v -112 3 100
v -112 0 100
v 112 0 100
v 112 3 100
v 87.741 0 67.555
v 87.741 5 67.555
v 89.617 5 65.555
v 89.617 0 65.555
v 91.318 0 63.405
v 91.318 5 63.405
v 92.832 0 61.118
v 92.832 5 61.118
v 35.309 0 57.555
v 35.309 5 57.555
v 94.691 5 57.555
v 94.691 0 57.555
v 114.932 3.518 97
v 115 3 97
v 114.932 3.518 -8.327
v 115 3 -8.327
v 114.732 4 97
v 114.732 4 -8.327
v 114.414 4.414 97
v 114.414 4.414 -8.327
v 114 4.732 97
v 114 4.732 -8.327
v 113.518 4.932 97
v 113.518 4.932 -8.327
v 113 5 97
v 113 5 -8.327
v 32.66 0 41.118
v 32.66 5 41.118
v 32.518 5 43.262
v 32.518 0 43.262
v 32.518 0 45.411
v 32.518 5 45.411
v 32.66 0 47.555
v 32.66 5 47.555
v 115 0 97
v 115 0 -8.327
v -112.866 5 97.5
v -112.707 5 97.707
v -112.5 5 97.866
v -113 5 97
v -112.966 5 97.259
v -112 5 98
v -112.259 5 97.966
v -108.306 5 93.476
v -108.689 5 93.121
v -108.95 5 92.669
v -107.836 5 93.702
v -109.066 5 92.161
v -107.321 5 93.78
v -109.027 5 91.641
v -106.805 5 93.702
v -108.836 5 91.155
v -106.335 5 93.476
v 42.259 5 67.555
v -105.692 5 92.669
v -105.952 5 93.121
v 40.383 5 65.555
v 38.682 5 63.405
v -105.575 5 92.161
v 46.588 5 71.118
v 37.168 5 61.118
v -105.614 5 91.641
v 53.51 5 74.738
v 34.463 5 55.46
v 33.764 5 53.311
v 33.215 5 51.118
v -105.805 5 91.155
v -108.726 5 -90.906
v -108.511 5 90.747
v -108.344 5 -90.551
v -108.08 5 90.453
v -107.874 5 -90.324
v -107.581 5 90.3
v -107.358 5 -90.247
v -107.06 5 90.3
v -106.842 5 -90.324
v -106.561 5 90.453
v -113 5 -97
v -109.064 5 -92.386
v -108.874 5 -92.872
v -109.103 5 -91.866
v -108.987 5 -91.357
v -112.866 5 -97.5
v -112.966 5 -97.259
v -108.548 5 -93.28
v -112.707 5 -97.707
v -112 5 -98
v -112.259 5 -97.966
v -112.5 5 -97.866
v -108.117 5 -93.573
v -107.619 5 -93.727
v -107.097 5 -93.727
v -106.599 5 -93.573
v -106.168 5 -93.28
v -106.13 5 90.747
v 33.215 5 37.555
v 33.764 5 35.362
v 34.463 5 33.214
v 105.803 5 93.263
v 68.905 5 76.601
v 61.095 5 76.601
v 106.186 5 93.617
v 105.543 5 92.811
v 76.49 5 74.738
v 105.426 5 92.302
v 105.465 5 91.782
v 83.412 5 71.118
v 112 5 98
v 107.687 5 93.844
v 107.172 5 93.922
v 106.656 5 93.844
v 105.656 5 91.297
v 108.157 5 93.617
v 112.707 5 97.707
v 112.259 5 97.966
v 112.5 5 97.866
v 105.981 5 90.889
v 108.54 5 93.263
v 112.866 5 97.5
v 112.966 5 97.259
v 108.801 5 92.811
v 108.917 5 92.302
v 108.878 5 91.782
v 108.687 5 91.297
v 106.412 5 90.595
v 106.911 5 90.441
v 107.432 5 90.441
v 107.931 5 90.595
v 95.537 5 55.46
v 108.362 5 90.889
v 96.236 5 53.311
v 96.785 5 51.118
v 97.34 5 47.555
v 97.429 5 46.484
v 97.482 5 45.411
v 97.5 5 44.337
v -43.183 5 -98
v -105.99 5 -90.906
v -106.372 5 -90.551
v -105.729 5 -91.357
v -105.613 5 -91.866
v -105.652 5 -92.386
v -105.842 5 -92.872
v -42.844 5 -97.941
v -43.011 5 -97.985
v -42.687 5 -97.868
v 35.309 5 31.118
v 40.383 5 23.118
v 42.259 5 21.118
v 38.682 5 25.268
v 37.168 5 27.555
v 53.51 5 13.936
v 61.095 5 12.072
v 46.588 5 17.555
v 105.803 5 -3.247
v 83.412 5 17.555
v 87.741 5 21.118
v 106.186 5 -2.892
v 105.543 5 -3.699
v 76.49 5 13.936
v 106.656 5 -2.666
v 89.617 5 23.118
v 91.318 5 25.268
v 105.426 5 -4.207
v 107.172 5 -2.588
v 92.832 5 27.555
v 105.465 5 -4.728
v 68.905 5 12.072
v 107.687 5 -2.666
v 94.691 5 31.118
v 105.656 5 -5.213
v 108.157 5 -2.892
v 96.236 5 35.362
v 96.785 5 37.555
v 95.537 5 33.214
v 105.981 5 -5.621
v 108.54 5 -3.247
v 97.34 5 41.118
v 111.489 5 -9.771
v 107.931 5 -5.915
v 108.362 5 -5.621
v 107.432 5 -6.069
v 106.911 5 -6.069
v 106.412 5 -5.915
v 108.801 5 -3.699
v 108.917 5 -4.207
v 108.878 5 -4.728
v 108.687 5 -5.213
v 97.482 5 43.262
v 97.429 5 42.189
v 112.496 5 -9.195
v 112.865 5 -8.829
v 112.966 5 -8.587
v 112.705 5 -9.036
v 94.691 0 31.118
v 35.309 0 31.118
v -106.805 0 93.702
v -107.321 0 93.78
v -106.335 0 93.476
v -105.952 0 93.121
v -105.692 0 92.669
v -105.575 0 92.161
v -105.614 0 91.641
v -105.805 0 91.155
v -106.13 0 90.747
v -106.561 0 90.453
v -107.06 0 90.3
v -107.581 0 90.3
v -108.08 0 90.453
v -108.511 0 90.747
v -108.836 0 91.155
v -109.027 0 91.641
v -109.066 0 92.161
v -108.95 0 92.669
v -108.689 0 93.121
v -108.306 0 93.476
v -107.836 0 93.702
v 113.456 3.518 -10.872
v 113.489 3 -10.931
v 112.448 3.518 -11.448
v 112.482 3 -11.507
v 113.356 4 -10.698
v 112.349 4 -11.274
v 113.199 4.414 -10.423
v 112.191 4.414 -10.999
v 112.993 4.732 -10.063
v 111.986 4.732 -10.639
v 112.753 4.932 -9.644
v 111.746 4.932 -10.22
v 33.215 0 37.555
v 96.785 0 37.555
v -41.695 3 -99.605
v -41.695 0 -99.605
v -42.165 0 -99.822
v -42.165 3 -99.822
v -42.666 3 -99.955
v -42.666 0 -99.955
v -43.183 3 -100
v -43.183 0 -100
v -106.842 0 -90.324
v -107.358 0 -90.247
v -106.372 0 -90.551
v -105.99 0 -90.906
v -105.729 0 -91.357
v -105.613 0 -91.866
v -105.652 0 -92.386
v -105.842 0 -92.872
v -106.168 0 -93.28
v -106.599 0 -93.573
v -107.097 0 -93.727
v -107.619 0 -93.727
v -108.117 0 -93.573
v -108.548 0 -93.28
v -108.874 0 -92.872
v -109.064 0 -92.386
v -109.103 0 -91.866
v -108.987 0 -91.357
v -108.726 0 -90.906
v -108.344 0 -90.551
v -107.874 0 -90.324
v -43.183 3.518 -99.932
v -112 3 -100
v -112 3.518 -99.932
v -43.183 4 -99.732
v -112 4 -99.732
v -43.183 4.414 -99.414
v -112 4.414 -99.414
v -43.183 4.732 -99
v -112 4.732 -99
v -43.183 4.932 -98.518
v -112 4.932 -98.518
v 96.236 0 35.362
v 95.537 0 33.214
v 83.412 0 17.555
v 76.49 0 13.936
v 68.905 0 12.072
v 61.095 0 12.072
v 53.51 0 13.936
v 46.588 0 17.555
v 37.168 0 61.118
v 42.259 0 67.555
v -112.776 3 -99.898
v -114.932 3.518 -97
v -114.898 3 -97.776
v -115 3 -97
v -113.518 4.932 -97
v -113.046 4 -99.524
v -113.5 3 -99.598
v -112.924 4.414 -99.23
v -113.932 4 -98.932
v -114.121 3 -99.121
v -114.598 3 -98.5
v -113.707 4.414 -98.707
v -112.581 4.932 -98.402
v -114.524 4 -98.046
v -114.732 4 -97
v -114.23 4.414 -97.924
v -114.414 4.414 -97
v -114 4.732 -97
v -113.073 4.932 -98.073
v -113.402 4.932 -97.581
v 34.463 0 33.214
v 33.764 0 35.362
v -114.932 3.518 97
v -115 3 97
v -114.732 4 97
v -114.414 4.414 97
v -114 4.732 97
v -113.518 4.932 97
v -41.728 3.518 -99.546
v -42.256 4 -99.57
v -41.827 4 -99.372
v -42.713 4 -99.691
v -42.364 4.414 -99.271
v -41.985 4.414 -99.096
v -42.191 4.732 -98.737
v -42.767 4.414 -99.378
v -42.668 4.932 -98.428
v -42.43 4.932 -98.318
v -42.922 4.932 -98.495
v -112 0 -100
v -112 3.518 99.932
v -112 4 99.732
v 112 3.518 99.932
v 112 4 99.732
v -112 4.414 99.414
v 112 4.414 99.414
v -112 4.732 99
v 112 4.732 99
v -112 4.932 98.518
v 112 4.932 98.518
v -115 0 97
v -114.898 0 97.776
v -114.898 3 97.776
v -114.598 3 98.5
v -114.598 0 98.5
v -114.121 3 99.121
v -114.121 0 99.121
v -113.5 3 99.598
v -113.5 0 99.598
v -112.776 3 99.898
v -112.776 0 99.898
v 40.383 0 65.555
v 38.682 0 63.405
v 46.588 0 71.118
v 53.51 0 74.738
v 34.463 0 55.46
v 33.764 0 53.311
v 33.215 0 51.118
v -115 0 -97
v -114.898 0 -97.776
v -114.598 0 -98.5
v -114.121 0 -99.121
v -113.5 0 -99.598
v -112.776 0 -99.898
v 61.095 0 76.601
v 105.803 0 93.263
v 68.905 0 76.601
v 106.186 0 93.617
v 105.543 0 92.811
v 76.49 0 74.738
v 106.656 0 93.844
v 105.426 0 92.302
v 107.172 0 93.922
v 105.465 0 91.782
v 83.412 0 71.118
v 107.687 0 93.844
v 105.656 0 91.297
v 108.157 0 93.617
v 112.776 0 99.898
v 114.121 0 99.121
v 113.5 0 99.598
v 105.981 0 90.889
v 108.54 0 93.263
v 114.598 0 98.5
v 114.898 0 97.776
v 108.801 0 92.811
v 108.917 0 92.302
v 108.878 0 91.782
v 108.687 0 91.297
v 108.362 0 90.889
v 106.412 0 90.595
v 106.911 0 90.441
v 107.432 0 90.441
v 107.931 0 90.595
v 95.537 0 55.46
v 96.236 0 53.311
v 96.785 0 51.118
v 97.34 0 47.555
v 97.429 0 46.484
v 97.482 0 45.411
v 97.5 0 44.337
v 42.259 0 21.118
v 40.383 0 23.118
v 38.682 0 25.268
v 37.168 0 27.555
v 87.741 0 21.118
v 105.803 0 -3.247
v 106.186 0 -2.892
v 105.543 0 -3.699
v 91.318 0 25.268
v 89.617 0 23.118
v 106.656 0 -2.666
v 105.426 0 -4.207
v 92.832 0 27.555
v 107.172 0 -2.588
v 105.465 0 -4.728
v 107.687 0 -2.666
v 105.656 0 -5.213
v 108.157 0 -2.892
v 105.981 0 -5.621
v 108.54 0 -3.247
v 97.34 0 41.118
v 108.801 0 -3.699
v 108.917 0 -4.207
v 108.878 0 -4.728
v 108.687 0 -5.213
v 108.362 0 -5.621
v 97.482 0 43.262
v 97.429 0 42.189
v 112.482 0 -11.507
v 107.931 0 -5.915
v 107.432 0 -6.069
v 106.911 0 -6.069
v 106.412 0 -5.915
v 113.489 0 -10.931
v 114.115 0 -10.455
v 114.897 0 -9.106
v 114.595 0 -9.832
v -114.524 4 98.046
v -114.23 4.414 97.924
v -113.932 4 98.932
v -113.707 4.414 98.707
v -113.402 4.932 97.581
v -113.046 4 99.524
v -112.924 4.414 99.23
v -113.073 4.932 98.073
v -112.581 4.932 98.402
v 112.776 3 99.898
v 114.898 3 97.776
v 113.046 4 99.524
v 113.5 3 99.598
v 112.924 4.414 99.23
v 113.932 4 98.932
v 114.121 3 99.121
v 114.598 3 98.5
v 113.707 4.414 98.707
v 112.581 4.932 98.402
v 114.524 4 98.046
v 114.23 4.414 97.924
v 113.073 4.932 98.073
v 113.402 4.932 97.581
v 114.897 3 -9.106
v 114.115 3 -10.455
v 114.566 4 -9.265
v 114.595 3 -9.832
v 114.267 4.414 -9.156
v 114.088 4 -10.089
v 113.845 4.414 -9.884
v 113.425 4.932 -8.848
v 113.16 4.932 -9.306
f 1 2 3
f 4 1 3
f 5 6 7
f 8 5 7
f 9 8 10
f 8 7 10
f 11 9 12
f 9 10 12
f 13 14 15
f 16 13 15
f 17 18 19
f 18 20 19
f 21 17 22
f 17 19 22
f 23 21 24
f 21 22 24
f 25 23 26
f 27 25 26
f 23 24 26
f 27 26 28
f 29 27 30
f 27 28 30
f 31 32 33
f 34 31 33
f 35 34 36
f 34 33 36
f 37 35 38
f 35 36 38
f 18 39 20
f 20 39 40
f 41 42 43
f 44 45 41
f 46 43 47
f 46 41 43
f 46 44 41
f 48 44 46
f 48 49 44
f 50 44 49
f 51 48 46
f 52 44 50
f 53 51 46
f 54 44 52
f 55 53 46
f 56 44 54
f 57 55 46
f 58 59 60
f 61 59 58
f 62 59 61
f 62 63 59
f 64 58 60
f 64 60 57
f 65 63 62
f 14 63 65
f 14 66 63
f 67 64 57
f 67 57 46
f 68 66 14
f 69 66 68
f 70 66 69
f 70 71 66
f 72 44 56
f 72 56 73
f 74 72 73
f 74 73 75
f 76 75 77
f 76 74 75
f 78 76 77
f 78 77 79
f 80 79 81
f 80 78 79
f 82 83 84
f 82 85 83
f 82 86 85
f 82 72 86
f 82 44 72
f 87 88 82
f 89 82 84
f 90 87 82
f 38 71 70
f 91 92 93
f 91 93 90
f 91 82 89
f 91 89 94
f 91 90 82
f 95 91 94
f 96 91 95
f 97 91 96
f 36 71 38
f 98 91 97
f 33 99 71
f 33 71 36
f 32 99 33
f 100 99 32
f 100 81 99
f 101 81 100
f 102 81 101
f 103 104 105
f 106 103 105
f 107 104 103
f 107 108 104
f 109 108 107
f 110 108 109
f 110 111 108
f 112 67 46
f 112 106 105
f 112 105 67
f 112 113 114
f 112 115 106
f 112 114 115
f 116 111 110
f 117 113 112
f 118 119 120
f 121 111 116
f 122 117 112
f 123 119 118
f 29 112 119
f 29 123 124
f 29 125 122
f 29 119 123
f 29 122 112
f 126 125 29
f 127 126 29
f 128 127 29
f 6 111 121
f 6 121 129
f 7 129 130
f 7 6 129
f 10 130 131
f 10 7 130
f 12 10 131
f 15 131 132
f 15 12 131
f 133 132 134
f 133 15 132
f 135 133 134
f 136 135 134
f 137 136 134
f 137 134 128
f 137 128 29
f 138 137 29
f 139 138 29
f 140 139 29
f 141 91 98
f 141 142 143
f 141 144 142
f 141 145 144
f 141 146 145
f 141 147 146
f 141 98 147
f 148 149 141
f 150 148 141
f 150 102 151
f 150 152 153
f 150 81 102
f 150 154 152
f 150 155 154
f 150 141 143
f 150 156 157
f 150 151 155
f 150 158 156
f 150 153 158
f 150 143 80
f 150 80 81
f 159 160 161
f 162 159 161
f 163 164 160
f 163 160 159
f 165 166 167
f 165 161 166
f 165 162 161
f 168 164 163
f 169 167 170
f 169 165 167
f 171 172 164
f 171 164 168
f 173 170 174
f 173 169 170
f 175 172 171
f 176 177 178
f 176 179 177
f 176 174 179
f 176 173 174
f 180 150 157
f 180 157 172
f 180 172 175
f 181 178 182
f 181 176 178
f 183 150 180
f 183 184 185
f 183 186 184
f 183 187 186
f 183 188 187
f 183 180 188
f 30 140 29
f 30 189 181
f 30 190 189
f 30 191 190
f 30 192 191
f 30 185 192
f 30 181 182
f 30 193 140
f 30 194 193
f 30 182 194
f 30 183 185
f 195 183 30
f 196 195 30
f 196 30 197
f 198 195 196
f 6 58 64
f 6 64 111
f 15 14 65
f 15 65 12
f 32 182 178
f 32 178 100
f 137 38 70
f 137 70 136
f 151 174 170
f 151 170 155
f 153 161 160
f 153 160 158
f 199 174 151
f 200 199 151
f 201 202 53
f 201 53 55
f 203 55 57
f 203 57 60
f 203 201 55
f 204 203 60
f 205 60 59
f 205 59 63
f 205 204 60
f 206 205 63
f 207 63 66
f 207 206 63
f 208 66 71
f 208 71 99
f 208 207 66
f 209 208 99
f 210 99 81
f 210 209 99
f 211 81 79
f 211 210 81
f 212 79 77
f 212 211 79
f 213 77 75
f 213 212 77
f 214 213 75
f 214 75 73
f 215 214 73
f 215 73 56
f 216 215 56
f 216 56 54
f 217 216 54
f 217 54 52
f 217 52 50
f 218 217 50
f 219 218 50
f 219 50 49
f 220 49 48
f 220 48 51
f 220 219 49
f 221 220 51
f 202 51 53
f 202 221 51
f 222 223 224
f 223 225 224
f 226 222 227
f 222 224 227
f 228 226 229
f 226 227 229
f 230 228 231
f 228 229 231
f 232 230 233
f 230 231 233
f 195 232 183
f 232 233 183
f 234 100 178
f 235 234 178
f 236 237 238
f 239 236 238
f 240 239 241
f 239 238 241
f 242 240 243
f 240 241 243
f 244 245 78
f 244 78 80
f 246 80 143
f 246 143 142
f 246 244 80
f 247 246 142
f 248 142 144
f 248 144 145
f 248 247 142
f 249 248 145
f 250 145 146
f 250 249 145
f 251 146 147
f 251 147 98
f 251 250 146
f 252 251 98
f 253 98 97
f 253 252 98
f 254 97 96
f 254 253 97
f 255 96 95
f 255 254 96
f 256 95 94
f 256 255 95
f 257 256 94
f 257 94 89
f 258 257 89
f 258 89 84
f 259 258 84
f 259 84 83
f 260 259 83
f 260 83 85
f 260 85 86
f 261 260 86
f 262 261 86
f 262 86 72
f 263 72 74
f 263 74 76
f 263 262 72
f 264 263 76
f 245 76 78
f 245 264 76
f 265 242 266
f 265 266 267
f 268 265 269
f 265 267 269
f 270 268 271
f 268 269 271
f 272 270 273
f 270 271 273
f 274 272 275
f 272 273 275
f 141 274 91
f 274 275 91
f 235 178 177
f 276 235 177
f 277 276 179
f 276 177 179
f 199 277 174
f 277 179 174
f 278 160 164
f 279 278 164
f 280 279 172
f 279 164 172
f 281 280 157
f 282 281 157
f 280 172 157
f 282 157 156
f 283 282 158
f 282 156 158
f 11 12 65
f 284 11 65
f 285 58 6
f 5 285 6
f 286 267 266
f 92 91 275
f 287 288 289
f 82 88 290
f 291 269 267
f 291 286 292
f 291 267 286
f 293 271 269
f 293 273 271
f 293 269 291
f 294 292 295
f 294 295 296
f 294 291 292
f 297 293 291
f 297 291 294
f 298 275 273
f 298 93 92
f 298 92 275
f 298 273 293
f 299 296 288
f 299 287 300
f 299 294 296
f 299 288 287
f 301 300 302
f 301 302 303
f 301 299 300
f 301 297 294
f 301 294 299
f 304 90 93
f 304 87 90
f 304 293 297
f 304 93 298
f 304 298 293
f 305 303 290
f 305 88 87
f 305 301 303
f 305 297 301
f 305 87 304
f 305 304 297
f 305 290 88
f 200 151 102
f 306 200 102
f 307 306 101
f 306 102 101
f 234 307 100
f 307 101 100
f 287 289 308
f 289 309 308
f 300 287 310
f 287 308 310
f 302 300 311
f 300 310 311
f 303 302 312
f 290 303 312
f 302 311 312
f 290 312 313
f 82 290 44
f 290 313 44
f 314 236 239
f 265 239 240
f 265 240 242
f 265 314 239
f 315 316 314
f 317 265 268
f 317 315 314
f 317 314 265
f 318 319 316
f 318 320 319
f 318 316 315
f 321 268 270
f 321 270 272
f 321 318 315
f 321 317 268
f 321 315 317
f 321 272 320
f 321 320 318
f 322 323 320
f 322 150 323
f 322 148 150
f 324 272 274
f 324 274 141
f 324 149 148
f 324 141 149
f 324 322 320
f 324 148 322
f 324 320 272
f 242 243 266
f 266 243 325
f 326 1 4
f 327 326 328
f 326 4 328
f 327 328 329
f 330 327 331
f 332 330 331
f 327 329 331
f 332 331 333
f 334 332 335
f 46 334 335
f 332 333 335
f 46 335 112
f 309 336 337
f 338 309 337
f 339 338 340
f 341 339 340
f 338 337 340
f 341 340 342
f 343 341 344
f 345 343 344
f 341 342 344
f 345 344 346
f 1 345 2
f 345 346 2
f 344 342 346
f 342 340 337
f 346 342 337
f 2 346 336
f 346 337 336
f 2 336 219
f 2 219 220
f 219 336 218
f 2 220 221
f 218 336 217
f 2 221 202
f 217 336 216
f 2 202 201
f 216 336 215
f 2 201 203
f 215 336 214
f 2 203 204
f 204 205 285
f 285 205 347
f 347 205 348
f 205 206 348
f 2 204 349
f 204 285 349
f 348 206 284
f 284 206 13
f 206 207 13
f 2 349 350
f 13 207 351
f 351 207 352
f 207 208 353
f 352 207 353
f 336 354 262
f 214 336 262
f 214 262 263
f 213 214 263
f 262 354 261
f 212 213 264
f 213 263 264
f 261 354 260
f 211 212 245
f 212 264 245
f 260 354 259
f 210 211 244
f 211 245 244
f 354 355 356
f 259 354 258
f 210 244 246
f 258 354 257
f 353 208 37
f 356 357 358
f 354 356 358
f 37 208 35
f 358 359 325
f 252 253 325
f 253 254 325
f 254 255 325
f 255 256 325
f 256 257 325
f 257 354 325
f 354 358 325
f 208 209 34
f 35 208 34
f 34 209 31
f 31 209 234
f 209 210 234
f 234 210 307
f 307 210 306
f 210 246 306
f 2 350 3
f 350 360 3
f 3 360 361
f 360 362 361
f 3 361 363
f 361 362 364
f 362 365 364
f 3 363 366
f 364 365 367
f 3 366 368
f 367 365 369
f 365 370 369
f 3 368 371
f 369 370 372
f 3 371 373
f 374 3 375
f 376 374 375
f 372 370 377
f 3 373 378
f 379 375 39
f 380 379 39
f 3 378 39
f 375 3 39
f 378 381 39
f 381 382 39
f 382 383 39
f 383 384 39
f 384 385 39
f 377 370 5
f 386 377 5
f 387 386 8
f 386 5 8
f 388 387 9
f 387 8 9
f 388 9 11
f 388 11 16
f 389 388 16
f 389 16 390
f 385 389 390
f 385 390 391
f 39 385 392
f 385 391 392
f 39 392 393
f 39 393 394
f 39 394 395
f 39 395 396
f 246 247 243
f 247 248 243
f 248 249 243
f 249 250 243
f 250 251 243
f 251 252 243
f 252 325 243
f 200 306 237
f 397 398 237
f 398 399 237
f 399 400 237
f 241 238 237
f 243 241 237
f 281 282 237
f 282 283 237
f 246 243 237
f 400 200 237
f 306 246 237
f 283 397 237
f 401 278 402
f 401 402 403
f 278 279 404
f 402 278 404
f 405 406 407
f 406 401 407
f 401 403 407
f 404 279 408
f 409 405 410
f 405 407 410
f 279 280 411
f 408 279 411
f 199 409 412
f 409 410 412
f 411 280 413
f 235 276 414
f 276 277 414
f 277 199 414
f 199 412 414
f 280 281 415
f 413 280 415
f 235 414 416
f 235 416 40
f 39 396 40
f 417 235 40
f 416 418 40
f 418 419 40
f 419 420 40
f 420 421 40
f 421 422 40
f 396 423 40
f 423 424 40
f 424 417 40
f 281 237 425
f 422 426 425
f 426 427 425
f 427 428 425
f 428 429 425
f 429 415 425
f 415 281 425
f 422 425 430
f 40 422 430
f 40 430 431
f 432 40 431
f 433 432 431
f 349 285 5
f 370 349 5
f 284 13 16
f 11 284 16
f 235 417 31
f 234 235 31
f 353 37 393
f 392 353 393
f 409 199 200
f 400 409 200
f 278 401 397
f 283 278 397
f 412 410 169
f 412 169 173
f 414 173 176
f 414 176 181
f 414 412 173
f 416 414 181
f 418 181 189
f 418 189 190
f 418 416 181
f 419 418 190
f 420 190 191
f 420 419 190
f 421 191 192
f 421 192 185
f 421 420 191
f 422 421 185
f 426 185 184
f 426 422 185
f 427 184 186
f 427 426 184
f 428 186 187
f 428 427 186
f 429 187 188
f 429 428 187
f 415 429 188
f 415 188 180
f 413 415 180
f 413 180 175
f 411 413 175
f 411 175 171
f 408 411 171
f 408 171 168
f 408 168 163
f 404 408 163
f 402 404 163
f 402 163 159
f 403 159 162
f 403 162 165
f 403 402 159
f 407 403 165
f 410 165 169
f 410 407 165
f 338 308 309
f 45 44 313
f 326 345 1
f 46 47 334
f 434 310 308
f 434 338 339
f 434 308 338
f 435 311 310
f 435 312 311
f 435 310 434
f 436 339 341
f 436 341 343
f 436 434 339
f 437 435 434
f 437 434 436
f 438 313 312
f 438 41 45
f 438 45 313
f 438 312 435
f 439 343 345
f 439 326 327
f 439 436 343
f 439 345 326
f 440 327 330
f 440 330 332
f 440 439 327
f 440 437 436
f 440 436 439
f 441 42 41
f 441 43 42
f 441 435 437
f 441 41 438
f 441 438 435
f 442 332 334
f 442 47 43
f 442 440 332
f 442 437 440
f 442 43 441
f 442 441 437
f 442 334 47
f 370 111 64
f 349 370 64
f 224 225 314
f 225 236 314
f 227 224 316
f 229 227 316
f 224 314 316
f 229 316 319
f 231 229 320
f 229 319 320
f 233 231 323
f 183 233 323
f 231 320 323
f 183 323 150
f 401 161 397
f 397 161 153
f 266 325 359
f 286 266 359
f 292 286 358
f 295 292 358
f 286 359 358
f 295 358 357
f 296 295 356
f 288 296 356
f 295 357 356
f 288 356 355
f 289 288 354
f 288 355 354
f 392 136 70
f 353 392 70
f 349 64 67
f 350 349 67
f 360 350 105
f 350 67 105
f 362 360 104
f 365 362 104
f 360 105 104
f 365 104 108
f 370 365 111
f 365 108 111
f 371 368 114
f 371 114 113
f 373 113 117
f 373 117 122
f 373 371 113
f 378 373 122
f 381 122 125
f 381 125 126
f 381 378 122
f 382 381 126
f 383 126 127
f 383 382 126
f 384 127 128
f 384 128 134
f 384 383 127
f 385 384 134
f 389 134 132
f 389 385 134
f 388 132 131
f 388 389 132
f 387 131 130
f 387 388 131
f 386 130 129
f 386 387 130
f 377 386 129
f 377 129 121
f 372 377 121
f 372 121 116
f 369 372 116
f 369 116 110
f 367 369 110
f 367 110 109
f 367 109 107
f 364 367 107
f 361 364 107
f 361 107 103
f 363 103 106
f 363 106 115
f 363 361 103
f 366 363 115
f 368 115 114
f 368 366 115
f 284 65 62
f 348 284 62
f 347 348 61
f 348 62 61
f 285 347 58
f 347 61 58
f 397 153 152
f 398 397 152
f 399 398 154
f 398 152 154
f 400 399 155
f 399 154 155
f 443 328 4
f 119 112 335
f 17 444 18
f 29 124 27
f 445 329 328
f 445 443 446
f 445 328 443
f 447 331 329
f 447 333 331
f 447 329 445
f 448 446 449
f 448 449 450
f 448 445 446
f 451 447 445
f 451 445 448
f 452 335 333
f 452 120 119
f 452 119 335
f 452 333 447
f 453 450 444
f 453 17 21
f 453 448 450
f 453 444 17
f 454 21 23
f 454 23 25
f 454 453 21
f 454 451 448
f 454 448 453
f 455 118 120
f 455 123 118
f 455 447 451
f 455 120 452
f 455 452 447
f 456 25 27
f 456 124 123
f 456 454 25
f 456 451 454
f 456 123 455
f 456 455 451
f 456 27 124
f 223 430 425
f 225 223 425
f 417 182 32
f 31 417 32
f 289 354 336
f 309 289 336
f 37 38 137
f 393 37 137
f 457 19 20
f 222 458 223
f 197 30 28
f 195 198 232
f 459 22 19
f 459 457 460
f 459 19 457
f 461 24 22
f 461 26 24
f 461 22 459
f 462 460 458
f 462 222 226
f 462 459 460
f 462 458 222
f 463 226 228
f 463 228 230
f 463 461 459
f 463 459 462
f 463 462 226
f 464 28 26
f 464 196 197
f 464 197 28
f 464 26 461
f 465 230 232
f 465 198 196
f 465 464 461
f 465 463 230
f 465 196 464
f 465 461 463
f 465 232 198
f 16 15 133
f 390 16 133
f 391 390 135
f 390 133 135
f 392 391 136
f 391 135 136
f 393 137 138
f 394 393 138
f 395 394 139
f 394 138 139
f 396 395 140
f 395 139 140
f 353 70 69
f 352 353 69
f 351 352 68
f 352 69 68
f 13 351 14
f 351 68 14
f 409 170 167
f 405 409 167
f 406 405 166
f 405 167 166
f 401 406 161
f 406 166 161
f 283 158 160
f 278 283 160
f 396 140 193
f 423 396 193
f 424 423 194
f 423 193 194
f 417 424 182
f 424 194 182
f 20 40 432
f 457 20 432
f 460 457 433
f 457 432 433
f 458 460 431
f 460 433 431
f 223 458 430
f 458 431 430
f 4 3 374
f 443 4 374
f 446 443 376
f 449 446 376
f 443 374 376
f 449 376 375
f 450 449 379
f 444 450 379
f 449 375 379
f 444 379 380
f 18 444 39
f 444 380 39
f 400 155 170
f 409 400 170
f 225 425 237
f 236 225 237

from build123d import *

# Parameters (mm, degrees)
SKETCH1_R           = 1.75
BOSS_EXTRUDE1_DEPTH = 5
CUT_EXTRUDE1_DEPTH  = 5
FILLET2_R           = 2


with BuildPart() as part:
    # Sketch1 → Boss-Extrude1 (new body)
    with BuildSketch(Plane(origin=(0, 0, 0), x_dir=(1, 0, 0), z_dir=(0, 1, 0))):
        with BuildLine():
            Line((-115, 97), (-115, -97))
            ThreePointArc((-115, -97), (-114.121320344, -99.121320344), (-112, -100))
            Line((-112, -100), (112, -100))
            ThreePointArc((112, -100), (114.121320344, -99.121320344), (115, -97))
            Line((115, -97), (115, 8.326847539))
            ThreePointArc((115, 8.326847539), (114.595001354, 9.832160786), (113.489354684, 10.931040816))
            Line((113.489354684, 10.931040816), (112.482257806, 11.50700592))
            Line((112.482257806, 11.50700592), (-41.694544071, 99.604753313))
            ThreePointArc((-41.694544071, 99.604753313), (-42.412938544, 99.899505125), (-43.182919083, 100))
            Line((-43.182919083, 100), (-112, 100))
            ThreePointArc((-112, 100), (-114.121320344, 99.121320344), (-115, 97))
        make_face()
        with Locations(Location((-107.357965586, 91.996726093, 0), (0, 0, 270))):
            Circle(SKETCH1_R, mode=Mode.SUBTRACT)
        with Locations(Location((107.171572875, 4.338256462, 0), (0, 0, 270))):
            Circle(SKETCH1_R, mode=Mode.SUBTRACT)
        with Locations(Location((107.171572875, -92.171572875, 0), (0, 0, 270))):
            Circle(SKETCH1_R, mode=Mode.SUBTRACT)
        with Locations(Location((-107.320588757, -92.030024345, 0), (0, 0, 270))):
            Circle(SKETCH1_R, mode=Mode.SUBTRACT)
    extrude(amount=BOSS_EXTRUDE1_DEPTH)

    # Sketch2 → Cut-Extrude1 (cut)
    with BuildSketch(Plane(origin=(0, 5, 0), x_dir=(1, 0, 0), z_dir=(0, 1, 0))):
        with BuildLine():
            ThreePointArc((83.411536631, -17.554766753), (65, -11.836576231), (46.588463369, -17.554766753))
            Line((46.588463369, -17.554766753), (83.411536631, -17.554766753))
        make_face()
        with BuildLine():
            ThreePointArc((42.258724115, -21.118385708), (39.509391878, -24.17525441), (37.167988383, -27.554766753))
            Line((37.167988383, -27.554766753), (92.832011617, -27.554766753))
            ThreePointArc((92.832011617, -27.554766753), (90.490608122, -24.17525441), (87.741275885, -21.118385708))
            Line((87.741275885, -21.118385708), (42.258724115, -21.118385708))
        make_face()
        with BuildLine():
            Line((94.690561452, -31.118385708), (35.309438548, -31.118385708))
            ThreePointArc((35.309438548, -31.118385708), (34.094437197, -34.281916226), (33.215458786, -37.554766753))
            Line((33.215458786, -37.554766753), (96.784541214, -37.554766753))
            ThreePointArc((96.784541214, -37.554766753), (95.905562803, -34.281916226), (94.690561452, -31.118385708))
        make_face()
        with BuildLine():
            Line((97.340272877, -41.118385708), (32.659727123, -41.118385708))
            ThreePointArc((32.659727123, -41.118385708), (32.5, -44.336576231), (32.659727123, -47.554766753))
            Line((32.659727123, -47.554766753), (97.340272877, -47.554766753))
            ThreePointArc((97.340272877, -47.554766753), (97.460043658, -45.94765219), (97.5, -44.336576231))
            ThreePointArc((97.5, -44.336576231), (97.460043658, -42.725500271), (97.340272877, -41.118385708))
        make_face()
        with BuildLine():
            Line((96.784541214, -51.118385708), (33.215458786, -51.118385708))
            ThreePointArc((33.215458786, -51.118385708), (34.094437197, -54.391236236), (35.309438548, -57.554766753))
            Line((35.309438548, -57.554766753), (94.690561452, -57.554766753))
            ThreePointArc((94.690561452, -57.554766753), (95.905562803, -54.391236236), (96.784541214, -51.118385708))
        make_face()
        with BuildLine():
            Line((92.832011617, -61.118385708), (37.167988383, -61.118385708))
            ThreePointArc((37.167988383, -61.118385708), (39.509391878, -64.497898052), (42.258724115, -67.554766753))
            Line((42.258724115, -67.554766753), (87.741275885, -67.554766753))
            ThreePointArc((87.741275885, -67.554766753), (90.490608122, -64.497898052), (92.832011617, -61.118385708))
        make_face()
        with BuildLine():
            Line((83.411536631, -71.118385708), (46.588463369, -71.118385708))
            ThreePointArc((46.588463369, -71.118385708), (65, -76.836576231), (83.411536631, -71.118385708))
        make_face()
    extrude(amount=-CUT_EXTRUDE1_DEPTH, mode=Mode.SUBTRACT)

    # Fillet2
    fillet2_edges = [part.edges().sort_by_distance(p)[0] for p in [
        (-114.121320344, 5, 99.121320344),
        (0, 5, 100),
        (114.121320344, 5, 99.121320344),
        (115, 5, 44.336576231),
        (114.595001354, 5, -9.832160786),
        (112.985806245, 5, -11.219023368),
        (35.393856868, 5, -55.555879616),
        (-42.412938544, 5, -99.899505125),
        (-77.591459542, 5, -100),
        (-114.121320344, 5, -99.121320344),
        (-115, 5, 0),
    ]]
    fillet(fillet2_edges, radius=FILLET2_R)


solid = part.part
